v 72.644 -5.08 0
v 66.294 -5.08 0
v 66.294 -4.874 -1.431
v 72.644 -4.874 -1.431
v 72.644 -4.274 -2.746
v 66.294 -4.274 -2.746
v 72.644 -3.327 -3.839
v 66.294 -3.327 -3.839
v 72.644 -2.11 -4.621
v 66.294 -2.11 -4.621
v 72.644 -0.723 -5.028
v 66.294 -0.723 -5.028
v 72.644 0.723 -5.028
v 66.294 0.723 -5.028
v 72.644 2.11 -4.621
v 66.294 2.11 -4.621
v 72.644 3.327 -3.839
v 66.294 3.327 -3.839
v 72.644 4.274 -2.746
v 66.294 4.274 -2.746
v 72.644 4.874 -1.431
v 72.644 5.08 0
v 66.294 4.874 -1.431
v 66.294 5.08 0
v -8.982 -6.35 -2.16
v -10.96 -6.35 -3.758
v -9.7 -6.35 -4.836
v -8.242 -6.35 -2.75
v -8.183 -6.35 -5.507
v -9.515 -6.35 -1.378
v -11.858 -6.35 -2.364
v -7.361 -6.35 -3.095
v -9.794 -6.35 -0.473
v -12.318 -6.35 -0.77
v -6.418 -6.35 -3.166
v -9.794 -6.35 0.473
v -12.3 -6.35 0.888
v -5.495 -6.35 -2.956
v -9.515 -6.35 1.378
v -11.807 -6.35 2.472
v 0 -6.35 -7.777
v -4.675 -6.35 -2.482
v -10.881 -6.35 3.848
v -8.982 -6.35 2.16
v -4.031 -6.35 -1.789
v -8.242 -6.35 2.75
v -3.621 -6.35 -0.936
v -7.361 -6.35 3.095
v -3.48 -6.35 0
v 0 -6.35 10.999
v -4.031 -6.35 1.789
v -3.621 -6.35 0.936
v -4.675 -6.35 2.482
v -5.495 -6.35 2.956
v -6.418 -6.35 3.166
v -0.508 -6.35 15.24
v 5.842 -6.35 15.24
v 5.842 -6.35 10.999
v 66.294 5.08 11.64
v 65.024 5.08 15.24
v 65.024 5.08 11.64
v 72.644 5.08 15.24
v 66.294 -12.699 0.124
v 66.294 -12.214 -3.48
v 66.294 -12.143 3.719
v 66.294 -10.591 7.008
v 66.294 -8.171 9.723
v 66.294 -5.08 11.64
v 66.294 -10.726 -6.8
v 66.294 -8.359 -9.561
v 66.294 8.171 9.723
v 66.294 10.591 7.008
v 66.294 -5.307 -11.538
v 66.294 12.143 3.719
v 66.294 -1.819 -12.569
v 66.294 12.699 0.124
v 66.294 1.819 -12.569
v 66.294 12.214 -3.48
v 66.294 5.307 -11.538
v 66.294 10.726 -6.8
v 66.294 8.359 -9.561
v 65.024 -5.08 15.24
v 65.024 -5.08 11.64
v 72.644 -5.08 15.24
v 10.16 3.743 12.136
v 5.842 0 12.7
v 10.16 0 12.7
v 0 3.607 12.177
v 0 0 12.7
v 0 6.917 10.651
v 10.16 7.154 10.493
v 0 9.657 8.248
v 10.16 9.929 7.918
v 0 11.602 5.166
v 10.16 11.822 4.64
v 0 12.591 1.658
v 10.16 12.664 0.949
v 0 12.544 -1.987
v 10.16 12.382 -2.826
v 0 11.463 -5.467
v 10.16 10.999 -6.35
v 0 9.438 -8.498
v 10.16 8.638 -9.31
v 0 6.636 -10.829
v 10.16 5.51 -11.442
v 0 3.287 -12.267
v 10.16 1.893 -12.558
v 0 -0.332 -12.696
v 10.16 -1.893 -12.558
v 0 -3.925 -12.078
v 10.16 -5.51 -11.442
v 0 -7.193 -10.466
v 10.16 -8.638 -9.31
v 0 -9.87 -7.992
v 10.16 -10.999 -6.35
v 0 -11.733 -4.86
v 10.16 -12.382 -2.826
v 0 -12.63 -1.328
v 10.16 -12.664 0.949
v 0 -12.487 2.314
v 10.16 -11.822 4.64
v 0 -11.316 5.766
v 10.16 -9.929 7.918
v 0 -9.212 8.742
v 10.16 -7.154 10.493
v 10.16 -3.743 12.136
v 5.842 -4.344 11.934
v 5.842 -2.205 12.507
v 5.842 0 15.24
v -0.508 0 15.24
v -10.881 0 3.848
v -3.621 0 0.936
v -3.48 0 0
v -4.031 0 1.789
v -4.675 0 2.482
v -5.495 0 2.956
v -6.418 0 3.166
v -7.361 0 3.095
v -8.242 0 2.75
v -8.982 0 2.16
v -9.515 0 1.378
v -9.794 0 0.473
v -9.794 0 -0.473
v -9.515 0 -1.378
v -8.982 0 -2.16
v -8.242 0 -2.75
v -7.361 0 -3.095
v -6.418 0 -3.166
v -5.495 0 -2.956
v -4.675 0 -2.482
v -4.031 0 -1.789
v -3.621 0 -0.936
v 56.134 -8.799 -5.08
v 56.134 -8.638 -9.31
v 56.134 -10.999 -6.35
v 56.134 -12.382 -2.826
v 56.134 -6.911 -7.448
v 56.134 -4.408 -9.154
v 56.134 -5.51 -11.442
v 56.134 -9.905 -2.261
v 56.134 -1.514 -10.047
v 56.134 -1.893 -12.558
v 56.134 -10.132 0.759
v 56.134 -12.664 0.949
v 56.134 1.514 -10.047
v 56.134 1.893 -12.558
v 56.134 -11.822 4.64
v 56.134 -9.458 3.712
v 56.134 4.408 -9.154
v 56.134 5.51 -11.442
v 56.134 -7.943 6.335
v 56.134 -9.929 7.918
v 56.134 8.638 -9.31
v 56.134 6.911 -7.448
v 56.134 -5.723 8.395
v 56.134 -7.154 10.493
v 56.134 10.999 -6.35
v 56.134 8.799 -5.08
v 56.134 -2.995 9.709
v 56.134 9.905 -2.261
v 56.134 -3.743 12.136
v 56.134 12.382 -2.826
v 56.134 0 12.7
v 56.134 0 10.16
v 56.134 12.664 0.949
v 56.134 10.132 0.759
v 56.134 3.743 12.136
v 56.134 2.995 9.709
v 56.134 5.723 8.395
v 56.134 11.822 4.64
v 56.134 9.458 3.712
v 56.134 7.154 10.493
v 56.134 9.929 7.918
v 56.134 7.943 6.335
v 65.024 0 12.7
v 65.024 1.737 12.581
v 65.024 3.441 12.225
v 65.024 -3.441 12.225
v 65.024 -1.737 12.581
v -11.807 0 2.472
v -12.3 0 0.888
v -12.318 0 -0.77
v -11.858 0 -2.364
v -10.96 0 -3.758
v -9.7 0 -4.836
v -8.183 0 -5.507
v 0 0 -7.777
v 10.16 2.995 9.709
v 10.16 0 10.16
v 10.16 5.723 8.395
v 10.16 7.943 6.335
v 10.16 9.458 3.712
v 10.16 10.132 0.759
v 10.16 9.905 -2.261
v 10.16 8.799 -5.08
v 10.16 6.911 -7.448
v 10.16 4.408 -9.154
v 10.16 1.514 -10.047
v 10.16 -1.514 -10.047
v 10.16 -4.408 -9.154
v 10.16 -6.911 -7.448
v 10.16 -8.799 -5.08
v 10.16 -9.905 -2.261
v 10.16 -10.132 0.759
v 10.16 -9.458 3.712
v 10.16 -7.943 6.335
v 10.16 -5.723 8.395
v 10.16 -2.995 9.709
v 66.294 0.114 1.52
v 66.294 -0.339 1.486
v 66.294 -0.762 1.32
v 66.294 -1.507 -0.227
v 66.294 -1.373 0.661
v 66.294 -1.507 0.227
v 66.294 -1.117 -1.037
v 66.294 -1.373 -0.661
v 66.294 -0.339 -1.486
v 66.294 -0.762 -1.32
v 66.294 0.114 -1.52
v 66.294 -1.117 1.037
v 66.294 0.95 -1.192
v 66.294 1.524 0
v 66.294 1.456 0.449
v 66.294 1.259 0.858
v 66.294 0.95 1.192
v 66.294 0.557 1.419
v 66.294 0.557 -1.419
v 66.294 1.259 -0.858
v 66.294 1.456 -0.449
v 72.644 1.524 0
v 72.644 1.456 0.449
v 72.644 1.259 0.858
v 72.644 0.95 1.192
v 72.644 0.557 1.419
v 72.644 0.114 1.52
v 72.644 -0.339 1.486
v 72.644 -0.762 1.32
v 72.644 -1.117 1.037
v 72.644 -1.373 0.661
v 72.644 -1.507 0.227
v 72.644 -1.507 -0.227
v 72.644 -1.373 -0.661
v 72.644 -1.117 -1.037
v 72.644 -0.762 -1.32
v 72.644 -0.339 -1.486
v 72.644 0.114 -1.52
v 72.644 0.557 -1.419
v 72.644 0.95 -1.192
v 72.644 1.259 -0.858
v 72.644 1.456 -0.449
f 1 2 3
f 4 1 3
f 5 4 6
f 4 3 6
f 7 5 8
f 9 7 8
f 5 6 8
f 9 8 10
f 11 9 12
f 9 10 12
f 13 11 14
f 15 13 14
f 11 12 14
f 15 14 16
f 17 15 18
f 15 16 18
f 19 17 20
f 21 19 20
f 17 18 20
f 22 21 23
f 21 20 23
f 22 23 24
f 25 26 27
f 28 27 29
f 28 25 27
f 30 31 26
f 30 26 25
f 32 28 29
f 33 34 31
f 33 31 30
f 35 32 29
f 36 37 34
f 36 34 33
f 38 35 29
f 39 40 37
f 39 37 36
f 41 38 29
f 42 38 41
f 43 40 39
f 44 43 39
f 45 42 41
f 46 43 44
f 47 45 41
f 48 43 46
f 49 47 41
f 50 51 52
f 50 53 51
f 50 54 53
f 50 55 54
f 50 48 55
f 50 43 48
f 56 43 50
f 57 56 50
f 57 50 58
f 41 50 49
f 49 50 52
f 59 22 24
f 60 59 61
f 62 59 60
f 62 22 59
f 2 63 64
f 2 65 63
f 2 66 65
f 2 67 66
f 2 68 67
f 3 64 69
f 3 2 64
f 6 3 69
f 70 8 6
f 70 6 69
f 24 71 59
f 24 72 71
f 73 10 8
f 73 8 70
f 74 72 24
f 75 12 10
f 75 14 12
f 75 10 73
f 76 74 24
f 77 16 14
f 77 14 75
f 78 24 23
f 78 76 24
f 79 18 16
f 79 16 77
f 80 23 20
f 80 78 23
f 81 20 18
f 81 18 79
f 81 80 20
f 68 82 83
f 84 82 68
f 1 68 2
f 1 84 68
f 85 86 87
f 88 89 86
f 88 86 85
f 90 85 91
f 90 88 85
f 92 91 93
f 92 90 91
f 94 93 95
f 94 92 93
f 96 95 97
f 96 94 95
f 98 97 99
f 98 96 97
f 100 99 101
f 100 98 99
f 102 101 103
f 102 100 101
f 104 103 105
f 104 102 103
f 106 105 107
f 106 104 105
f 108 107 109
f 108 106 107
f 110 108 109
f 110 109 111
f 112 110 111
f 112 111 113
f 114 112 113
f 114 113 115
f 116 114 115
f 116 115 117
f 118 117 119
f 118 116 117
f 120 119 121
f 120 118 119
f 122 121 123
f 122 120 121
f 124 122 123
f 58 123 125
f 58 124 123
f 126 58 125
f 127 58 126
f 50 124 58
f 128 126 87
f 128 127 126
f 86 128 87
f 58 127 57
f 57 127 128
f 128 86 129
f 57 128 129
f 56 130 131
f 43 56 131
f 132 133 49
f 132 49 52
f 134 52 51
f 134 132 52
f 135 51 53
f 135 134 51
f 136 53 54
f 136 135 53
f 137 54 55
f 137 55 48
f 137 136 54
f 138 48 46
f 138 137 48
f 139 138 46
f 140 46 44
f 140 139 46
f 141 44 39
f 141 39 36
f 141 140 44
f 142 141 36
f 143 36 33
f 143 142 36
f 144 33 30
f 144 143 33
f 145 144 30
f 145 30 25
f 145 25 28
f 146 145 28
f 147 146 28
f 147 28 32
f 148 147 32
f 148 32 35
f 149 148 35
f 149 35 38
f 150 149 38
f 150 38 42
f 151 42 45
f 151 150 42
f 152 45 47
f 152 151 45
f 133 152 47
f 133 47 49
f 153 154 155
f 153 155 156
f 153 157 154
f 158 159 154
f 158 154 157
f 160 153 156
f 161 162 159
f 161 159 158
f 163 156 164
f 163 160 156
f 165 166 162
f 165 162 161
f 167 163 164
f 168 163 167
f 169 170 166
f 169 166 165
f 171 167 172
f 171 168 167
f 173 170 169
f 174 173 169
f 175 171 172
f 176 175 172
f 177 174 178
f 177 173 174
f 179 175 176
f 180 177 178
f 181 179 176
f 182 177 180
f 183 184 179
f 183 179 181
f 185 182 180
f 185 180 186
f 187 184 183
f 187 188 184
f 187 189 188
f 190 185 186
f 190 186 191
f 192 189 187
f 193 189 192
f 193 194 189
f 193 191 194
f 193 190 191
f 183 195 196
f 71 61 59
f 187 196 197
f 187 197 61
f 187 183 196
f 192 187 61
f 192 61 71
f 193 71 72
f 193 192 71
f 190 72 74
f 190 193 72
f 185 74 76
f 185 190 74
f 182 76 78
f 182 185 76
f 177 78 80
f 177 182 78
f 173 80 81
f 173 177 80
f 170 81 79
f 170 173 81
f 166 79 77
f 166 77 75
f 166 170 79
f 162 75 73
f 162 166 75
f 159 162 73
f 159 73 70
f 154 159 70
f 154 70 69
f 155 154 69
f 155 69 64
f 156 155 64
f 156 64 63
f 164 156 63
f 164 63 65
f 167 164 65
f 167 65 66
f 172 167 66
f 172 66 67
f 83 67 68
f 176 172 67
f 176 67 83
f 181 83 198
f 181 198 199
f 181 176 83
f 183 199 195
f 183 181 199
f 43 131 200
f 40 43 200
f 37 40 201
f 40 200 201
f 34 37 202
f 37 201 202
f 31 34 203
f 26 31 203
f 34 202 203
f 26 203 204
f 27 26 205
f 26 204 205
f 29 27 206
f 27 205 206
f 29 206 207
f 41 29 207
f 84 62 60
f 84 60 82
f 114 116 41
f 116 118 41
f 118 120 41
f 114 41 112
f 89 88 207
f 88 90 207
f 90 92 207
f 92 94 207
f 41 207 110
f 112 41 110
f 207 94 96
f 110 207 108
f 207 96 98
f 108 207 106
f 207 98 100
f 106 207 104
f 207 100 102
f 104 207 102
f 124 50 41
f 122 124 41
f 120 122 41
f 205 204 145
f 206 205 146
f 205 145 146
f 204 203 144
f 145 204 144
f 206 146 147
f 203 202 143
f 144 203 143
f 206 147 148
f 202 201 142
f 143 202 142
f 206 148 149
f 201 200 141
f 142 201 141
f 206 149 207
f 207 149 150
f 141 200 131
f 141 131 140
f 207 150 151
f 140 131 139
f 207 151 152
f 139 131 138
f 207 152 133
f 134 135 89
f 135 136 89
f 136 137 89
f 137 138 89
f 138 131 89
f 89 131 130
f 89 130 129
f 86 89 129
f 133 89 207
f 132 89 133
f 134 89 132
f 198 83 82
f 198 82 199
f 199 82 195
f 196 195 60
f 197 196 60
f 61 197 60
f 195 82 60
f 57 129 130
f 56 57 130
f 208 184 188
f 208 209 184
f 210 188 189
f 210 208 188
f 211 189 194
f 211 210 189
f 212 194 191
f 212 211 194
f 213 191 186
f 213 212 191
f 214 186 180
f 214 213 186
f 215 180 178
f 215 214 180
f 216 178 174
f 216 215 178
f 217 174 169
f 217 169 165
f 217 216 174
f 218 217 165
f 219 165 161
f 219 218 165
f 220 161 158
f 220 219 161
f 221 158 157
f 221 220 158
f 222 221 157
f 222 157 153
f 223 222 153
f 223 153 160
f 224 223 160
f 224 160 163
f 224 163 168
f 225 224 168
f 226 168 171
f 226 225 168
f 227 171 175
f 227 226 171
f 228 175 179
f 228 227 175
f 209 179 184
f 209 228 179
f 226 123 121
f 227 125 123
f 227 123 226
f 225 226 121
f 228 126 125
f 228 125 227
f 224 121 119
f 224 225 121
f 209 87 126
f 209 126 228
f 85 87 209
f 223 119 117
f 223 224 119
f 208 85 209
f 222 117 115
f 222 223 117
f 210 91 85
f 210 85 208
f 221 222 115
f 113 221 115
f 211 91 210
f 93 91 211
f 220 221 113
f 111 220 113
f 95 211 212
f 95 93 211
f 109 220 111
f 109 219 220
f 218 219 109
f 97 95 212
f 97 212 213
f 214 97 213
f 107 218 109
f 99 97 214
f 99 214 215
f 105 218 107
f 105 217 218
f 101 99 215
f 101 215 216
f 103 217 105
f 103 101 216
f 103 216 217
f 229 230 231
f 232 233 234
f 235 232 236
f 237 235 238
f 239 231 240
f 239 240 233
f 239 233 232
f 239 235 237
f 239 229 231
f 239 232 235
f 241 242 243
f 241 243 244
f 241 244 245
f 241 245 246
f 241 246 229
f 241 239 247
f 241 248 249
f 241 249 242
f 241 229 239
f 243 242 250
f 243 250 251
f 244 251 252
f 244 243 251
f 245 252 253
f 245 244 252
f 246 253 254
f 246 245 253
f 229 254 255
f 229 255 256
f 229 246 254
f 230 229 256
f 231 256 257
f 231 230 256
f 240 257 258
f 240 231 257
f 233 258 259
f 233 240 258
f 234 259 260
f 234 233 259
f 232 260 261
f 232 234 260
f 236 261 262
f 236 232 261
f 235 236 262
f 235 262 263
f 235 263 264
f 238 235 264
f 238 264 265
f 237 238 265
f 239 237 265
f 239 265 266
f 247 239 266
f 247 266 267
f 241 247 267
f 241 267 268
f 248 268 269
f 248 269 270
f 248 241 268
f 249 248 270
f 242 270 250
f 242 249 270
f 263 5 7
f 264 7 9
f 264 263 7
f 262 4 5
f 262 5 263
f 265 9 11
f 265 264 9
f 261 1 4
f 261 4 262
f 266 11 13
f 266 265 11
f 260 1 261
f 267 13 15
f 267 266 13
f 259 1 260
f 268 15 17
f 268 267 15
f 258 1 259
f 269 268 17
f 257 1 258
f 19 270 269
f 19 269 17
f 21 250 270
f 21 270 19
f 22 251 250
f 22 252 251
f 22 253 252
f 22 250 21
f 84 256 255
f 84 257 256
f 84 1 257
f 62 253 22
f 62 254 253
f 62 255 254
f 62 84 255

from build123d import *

# Parameters (mm, degrees)
F0_W     = 5.842
F0_H     = 12.7
F0_R     = 3.175
F2_DEPTH = 6.35
F3_R     = 1.524
F4_DEPTH = 6.35
F5_DEPTH = 7.62


with BuildPart() as f1:
    # F0 (on Front) → F1 (revolve)
    with BuildSketch(Plane.XZ):
        Polygon((5.842, 12.7), (5.842, 0), (66.294, 0), (66.294, 12.7), (56.134, 12.7), (56.134, 10.16), (10.16, 10.16), (10.16, 12.7), align=None)
        with Locations((2.921, 6.35)):
            Rectangle(F0_W, F0_H)
    revolve(axis=Axis((33.147, 0, 0), (-1, 0, 0)))

    # F0 (on Front) → F2 (join)
    with BuildSketch(Plane.XZ):
        with BuildLine():
            Line((-0.9398, 0), (0, 0))
            Line((0, 0), (0, 12.7))
            Line((0, 12.7), (5.842, 12.7))
            Line((5.842, 12.7), (5.842, 15.24))
            Line((5.842, 15.24), (-0.508, 15.24))
            Line((-0.508, 15.24), (-10.8806298187, 3.8475430269))
            ThreePointArc((-10.8806298187, 3.8475430269), (-4.5919612295, 5.3297205562), (-0.9398, 0))
        make_face()
        with BuildLine():
            Line((5.842, 0), (0, 0))
            Line((0, 0), (-0.9398, 0))
            ThreePointArc((-0.9398, 0), (-3.1957909266, -4.5493385486), (-8.1826630726, -5.5069827884))
            Line((-8.1826630726, -5.5069827884), (5.842, -9.398))
            Line((5.842, -9.398), (5.842, 0))
        make_face()
        with Locations((2.921, 6.35)):
            Rectangle(F0_W, F0_H)
        with BuildLine():
            ThreePointArc((-8.1826630726, -5.5069827884), (-3.1957909266, -4.5493385486), (-0.9398, 0))
            ThreePointArc((-0.9398, 0), (-4.5919612295, 5.3297205562), (-10.8806298187, 3.8475430269))
            ThreePointArc((-10.8806298187, 3.8475430269), (-12.1459778134, -1.5837270034), (-8.1826630726, -5.5069827884))
        make_face()
        with Locations((-6.6548, 0)):
            Circle(F0_R, mode=Mode.SUBTRACT)
    extrude(amount=F2_DEPTH)

    # F3 (on face) → F4 (join)
    with BuildSketch(Plane.YZ.offset(66.294)):
        with BuildLine():
            ThreePointArc((-5.08, 11.6397422652), (0, 12.7), (5.08, 11.6397422652))
            Line((5.08, 11.6397422652), (5.08, 15.24))
            Line((5.08, 15.24), (-5.08, 15.24))
            Line((-5.08, 15.24), (-5.08, 11.6397422652))
        make_face()
        with BuildLine():
            ThreePointArc((-5.08, 0), (0, 5.08), (5.08, 0))
            Line((5.08, 0), (5.08, 11.6397422652))
            ThreePointArc((5.08, 11.6397422652), (0, 12.7), (-5.08, 11.6397422652))
            Line((-5.08, 11.6397422652), (-5.08, 0))
        make_face()
        with BuildLine():
            ThreePointArc((-5.08, 0), (0, -5.08), (5.08, 0))
            ThreePointArc((5.08, 0), (0, 5.08), (-5.08, 0))
        make_face()
        Circle(F3_R, mode=Mode.SUBTRACT)
    extrude(amount=F4_DEPTH)

    # F5 (add): a face of the model
    f5_faces = [f1.faces().sort_by_distance(p)[0] for p in [
        (72.644, 0, 5.8085929676),
    ]]
    extrude(f5_faces, amount=-F5_DEPTH)


solid = f1.part
